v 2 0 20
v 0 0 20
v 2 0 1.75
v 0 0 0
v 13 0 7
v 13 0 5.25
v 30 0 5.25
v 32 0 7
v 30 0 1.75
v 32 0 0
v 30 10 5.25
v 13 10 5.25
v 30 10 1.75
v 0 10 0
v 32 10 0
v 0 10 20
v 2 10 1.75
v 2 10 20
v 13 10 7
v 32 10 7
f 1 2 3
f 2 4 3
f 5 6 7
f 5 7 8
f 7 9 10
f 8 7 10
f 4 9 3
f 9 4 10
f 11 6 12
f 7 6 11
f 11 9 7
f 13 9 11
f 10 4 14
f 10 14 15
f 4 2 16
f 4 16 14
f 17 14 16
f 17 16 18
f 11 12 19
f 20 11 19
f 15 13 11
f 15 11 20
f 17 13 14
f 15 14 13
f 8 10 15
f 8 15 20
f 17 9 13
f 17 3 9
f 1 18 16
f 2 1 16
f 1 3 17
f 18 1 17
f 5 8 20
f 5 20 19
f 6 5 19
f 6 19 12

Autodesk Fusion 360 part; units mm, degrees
sketch "Sketch1" plane through (0, 0, 0) normal (0, 1, 0) x (1, 0, 0)
  line L0 (0, 0) -> (28, 0)
  line L1 (28, 0) -> (28, -7)
  line L2 (28, -7) -> (13, -7)
  line L3 (13, -7) -> (13, -5)
  line L4 (13, -5) -> (26, -5)
  line L5 (26, -5) -> (26, -2)
  line L6 (26, -2) -> (2, -2)
  line L7 (2, -2) -> (2, -20)
  line L8 (2, -20) -> (0, -20)
  line L9 (0, -20) -> (0, 0)
extrude "Extrude1" add sketch "Sketch1" along normal blind 10
extrude "Extrude2" add 1 faces at (28, 3.3333, 2.3333) along direction (1, 0, 0) blind 4
extrude "Extrude3" cut 1 faces at (26, 3.3333, 4) along direction (1, 0, 0) blind 4
extrude "Extrude4" cut 1 faces at (18.6667, 3.3333, 5) along direction (0, 0, 1) blind 0.25
extrude "Extrude5" cut 1 faces at (11.3333, 3.3333, 2) along direction (0, 0, -1) blind 0.25
